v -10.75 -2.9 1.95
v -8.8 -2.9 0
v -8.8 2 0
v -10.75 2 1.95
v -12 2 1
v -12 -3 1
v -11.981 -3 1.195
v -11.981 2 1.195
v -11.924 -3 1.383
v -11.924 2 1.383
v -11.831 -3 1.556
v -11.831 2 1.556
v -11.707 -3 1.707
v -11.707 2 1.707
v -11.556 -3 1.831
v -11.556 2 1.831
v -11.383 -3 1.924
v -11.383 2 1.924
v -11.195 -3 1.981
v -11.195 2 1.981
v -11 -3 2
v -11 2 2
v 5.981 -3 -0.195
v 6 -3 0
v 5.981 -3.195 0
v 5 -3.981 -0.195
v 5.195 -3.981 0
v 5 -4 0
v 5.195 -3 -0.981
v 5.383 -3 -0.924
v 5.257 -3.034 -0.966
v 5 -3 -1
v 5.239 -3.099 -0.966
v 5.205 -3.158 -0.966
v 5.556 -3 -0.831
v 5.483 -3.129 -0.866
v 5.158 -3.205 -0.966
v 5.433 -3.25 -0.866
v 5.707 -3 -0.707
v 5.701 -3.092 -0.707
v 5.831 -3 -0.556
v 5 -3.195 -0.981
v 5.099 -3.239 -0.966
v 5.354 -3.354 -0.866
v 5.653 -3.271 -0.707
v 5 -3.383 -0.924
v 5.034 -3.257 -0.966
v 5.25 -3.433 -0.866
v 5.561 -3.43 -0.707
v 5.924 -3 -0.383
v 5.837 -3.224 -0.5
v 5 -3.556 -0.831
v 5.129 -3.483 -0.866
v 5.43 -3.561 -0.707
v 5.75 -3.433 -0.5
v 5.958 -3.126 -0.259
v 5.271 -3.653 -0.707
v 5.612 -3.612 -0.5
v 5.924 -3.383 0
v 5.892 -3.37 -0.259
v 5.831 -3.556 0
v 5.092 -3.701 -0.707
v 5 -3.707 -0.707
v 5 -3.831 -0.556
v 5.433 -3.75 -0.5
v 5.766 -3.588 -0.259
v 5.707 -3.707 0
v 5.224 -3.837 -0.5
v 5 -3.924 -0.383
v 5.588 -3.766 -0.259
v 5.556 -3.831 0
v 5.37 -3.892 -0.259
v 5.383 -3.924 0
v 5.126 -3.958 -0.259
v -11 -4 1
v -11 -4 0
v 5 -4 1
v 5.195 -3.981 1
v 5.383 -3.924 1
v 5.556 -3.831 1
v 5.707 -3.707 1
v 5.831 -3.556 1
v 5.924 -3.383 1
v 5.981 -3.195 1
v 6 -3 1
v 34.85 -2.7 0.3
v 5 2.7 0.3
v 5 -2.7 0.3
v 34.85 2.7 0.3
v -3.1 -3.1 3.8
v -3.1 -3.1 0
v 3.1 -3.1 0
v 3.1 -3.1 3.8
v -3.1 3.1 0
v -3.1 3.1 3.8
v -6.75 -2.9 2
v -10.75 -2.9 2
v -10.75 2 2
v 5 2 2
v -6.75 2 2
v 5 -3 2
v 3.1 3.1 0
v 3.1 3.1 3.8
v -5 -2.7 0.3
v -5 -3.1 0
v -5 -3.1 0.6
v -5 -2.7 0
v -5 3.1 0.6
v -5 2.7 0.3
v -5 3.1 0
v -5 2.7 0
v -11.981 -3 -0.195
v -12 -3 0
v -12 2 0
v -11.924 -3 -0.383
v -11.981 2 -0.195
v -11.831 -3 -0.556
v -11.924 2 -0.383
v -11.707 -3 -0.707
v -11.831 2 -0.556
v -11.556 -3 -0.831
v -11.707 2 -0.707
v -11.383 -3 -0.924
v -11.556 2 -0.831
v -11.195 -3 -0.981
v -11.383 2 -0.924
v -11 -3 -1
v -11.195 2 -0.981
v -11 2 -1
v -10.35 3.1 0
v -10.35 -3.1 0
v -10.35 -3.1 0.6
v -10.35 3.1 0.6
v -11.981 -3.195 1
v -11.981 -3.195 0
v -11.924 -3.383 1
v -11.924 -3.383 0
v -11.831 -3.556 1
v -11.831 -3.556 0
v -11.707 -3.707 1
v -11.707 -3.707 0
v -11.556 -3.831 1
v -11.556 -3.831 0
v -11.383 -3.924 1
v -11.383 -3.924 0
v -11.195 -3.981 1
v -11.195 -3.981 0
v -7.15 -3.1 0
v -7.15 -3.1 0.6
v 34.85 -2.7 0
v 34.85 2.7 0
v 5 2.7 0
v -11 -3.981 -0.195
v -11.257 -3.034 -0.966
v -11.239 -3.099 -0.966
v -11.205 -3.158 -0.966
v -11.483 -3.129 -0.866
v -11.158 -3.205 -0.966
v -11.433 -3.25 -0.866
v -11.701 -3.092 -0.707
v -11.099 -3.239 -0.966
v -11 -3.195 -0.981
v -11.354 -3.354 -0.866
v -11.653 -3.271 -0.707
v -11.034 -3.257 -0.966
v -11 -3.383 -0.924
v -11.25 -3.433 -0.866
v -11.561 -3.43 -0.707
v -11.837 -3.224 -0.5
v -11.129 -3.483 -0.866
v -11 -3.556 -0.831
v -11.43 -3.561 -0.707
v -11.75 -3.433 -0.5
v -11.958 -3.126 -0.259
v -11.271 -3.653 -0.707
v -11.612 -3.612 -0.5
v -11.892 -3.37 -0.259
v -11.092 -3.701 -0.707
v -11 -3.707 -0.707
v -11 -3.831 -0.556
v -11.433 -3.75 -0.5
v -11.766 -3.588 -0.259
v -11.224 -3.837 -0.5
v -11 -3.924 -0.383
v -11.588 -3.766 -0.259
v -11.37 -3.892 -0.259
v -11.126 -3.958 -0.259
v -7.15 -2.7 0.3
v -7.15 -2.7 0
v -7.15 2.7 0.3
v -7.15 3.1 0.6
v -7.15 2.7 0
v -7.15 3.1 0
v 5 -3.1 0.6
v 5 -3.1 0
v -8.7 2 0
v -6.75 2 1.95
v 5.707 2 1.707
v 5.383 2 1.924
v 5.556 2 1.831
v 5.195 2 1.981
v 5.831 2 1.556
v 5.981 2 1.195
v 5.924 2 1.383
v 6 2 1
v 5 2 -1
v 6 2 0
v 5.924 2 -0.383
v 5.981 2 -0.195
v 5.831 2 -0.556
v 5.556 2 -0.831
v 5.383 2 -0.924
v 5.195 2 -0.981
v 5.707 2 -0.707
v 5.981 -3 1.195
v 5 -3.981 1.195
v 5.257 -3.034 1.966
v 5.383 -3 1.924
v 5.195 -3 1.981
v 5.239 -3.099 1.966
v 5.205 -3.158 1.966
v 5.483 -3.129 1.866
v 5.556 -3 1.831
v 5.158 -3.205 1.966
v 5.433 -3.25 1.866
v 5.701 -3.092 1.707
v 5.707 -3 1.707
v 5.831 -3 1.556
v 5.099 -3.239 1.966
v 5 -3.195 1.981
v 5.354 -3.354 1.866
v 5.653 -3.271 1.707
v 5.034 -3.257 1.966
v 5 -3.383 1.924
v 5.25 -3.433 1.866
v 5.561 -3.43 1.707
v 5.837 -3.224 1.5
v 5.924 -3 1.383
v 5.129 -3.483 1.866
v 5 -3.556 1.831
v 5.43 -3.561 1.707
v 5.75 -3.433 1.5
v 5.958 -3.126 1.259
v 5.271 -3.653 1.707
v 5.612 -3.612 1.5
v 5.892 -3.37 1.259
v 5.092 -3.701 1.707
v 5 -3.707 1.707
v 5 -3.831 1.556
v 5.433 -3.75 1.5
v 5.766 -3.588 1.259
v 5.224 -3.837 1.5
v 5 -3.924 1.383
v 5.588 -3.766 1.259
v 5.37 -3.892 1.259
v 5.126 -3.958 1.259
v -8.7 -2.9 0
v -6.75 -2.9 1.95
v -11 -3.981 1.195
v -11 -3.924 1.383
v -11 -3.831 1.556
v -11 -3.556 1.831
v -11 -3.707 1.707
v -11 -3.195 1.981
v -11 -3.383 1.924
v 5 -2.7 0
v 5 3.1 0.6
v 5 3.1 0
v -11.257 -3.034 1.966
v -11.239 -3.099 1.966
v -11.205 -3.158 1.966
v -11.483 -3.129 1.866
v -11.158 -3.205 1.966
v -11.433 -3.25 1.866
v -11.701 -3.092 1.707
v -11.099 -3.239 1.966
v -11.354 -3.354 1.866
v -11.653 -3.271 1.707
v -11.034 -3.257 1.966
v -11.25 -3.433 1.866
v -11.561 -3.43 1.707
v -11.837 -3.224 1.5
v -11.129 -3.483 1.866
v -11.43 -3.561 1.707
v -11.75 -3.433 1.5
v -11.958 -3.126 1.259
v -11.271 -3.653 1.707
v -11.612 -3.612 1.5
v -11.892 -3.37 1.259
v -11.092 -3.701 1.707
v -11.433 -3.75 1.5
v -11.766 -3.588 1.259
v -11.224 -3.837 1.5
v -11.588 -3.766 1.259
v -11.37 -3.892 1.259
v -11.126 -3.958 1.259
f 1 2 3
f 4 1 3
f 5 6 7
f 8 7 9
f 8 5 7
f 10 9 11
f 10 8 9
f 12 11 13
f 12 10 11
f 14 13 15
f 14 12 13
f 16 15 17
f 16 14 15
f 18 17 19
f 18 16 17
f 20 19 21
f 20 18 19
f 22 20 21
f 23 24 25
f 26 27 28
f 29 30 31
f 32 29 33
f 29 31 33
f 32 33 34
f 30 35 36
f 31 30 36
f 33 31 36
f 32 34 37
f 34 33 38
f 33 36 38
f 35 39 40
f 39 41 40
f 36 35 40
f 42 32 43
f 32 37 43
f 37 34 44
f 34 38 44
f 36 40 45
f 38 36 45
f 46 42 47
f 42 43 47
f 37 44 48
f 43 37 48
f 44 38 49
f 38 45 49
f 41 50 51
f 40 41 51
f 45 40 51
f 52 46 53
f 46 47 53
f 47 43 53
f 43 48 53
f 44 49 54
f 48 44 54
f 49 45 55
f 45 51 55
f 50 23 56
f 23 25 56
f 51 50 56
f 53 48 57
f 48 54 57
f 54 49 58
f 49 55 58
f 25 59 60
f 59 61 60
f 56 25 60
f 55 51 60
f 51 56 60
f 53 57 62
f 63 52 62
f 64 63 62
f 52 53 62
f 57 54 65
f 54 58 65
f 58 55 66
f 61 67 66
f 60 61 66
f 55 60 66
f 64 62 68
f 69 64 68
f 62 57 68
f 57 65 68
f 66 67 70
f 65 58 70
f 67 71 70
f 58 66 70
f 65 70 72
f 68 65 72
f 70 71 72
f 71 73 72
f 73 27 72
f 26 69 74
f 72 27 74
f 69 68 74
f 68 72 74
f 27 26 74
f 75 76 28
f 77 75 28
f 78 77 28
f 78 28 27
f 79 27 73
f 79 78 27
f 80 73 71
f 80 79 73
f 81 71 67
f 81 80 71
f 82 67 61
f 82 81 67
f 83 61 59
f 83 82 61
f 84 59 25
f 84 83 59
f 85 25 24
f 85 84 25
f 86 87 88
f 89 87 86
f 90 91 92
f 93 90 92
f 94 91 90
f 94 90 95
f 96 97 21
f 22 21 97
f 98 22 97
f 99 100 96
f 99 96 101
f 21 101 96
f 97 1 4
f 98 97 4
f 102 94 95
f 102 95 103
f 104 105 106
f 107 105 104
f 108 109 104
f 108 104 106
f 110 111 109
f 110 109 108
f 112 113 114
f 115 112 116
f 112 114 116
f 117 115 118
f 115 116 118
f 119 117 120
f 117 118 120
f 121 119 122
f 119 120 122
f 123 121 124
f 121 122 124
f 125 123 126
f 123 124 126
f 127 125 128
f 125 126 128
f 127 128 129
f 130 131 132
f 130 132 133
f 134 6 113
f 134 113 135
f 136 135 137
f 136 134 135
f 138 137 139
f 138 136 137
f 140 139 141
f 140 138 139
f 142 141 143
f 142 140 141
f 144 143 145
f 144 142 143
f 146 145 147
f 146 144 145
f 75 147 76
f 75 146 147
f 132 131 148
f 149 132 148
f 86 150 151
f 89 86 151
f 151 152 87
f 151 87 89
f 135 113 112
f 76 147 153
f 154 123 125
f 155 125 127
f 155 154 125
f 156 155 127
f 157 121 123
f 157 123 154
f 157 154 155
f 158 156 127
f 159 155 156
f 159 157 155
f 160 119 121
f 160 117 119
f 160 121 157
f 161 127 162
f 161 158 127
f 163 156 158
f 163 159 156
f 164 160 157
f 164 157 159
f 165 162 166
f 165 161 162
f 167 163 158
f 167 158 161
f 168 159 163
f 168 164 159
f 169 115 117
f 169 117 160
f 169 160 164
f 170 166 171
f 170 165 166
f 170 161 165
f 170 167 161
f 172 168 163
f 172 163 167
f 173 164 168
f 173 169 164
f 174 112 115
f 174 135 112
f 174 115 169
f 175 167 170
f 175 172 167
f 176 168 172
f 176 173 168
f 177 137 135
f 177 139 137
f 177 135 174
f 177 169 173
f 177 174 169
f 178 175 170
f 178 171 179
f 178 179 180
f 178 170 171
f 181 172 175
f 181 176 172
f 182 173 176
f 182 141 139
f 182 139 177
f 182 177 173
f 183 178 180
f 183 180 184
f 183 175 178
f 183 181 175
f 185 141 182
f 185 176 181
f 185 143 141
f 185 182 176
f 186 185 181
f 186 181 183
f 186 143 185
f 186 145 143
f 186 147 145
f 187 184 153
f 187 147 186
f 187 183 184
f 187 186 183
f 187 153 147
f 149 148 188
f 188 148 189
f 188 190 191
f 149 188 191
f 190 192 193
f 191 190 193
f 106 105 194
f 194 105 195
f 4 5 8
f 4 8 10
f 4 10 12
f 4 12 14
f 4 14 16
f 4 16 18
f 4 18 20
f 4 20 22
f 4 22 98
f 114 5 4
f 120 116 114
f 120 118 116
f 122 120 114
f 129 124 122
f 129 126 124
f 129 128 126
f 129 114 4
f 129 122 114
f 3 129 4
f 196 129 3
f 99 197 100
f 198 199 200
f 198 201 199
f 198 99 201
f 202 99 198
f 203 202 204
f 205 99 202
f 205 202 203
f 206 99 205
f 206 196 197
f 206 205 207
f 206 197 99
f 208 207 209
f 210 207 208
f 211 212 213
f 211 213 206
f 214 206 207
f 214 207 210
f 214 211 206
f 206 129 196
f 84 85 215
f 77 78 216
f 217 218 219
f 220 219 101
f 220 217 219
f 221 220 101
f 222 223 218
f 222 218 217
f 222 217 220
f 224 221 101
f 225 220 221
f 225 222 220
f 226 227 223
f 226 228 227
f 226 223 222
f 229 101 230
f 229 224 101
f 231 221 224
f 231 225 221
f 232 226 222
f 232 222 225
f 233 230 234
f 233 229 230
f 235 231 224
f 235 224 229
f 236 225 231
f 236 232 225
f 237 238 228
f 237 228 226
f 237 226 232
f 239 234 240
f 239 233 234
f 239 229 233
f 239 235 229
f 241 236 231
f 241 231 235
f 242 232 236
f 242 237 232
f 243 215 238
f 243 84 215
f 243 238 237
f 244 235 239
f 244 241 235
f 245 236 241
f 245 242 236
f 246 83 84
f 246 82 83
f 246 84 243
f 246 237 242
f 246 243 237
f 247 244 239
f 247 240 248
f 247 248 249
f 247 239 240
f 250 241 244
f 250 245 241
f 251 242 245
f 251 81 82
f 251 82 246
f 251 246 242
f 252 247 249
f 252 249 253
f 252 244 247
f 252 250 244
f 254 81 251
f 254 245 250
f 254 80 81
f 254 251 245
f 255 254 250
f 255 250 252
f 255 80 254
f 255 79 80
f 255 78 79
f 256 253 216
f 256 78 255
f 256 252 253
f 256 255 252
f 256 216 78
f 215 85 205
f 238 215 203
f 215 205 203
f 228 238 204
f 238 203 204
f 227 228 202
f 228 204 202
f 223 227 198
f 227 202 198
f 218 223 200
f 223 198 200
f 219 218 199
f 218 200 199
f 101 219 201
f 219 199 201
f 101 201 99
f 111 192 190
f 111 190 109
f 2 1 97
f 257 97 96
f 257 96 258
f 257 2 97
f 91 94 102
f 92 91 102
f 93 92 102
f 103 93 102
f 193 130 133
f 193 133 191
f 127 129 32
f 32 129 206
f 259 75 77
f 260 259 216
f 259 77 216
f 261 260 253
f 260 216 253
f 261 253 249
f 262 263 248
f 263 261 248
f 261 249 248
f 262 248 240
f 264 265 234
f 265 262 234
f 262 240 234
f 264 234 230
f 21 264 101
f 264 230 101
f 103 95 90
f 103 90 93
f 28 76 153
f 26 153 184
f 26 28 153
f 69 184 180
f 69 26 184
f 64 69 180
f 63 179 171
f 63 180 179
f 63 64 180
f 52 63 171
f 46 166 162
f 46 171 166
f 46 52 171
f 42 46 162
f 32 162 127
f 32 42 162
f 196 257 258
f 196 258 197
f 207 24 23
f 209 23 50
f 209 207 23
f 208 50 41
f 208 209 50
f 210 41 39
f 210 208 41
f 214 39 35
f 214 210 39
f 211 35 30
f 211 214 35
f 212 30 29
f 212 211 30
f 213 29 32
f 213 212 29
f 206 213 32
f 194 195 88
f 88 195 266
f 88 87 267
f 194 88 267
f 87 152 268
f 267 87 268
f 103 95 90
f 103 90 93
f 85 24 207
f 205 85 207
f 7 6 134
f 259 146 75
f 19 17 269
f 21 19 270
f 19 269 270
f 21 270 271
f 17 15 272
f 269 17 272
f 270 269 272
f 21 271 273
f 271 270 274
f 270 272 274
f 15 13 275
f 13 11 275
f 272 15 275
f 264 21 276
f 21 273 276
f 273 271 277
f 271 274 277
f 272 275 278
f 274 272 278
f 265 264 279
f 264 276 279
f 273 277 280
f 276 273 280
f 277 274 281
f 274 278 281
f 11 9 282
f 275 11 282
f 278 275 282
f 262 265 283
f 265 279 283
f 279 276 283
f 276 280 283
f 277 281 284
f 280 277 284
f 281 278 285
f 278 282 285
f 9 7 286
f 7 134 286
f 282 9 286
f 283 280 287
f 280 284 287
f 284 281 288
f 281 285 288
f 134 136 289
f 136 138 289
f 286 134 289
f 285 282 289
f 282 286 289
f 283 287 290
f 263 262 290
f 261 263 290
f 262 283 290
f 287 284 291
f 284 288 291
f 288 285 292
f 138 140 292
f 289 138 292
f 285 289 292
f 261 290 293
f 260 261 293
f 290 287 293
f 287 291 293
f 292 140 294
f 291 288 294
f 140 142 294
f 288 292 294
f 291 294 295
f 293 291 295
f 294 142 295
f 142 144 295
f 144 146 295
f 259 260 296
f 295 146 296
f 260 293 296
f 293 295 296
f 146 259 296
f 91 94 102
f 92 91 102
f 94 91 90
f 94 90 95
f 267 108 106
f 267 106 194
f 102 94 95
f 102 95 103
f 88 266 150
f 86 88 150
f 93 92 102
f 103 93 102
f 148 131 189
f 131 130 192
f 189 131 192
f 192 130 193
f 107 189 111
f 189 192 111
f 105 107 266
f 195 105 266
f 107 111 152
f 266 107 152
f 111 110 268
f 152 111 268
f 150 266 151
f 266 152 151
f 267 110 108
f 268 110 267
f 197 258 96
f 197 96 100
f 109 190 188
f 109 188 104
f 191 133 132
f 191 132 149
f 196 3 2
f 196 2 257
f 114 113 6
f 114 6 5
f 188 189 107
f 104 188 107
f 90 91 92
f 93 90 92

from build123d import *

# Parameters (mm, degrees)
BOX_W        = 6.2
BOX_H        = 6.2
BOX_DEPTH    = 3.8
BOX003_W     = 3.2
BOX003_H     = 6.2
BOX003_DEPTH = 0.6
BOX002_W     = 2.15
BOX002_H     = 5.4
BOX002_DEPTH = 0.3
BOX001_W     = 10
BOX001_H     = 6.2
BOX001_DEPTH = 0.6
BOX004_W     = 30
BOX004_H     = 5.4
BOX004_DEPTH = 0.3
BOX006_W     = 6.2
BOX006_H     = 6.2
BOX006_DEPTH = 3.8
BOX007_W     = 4
BOX007_H     = 6.2
BOX007_DEPTH = 3
CHAMFER_SIZE = 1.95
BOX005_W     = 18
BOX005_H     = 6
BOX005_DEPTH = 3
FILLET_R     = 1


with BuildPart() as camera:
    # Box → Box (new body)
    with BuildSketch(Plane(origin=(-3.1, -3.1, 0), x_dir=(1, 0, 0), z_dir=(0, 0, 1))):
        with Locations((3.1, 3.1)):
            Rectangle(BOX_W, BOX_H)
    extrude(amount=BOX_DEPTH)


with BuildPart() as cube002:
    # Box003 → Box003 (new body)
    with BuildSketch(Plane(origin=(-10.35, -3.1, 0), x_dir=(1, 0, 0), z_dir=(0, 0, 1))):
        with Locations((1.6, 3.1)):
            Rectangle(BOX003_W, BOX003_H)
    extrude(amount=BOX003_DEPTH)


with BuildPart() as cube001:
    # Box002 → Box002 (new body)
    with BuildSketch(Plane(origin=(-7.15, -2.7, 0), x_dir=(1, 0, 0), z_dir=(0, 0, 1))):
        with Locations((1.075, 2.7)):
            Rectangle(BOX002_W, BOX002_H)
    extrude(amount=BOX002_DEPTH)


with BuildPart() as cube:
    # Box001 → Box001 (new body)
    with BuildSketch(Plane(origin=(-5, -3.1, 0), x_dir=(1, 0, 0), z_dir=(0, 0, 1))):
        with Locations((5, 3.1)):
            Rectangle(BOX001_W, BOX001_H)
    extrude(amount=BOX001_DEPTH)


with BuildPart() as fusion:
    # Box004 → Box004 (new body)
    with BuildSketch(Plane(origin=(4.85, -2.7, 0), x_dir=(1, 0, 0), z_dir=(0, 0, 1))):
        with Locations((15, 2.7)):
            Rectangle(BOX004_W, BOX004_H)
    extrude(amount=BOX004_DEPTH)

    # Fusion: union Cube002, Cube001, Cube
    add(cube002.part)
    add(cube001.part)
    add(cube.part)


with BuildPart() as camera001:
    # Box006 → Box006 (new body)
    with BuildSketch(Plane(origin=(-3.1, -3.1, 0), x_dir=(1, 0, 0), z_dir=(0, 0, 1))):
        with Locations((3.1, 3.1)):
            Rectangle(BOX006_W, BOX006_H)
    extrude(amount=BOX006_DEPTH)


with BuildPart() as chamfer_body:
    # Box007 → Box007 (new body)
    with BuildSketch(Plane(origin=(-10.75, -3.1, 0), x_dir=(1, 0, 0), z_dir=(0, 0, 1))):
        with Locations((2, 3.1)):
            Rectangle(BOX007_W, BOX007_H)
    extrude(amount=BOX007_DEPTH)

    # Chamfer
    chamfer_edges = [chamfer_body.edges().sort_by_distance(p)[0] for p in [
        (-10.75, 0, 0),
        (-6.75, 0, 0),
    ]]
    chamfer(chamfer_edges, length=CHAMFER_SIZE)


with BuildPart() as chamfer_body_1:
    # Chamfer placement: moved
    add(chamfer_body.part.moved(Location((0, 0.2, 0))))


with BuildPart() as cut:
    # Box005 → Box005 (new body)
    with BuildSketch(Plane(origin=(-12, -4, -1), x_dir=(1, 0, 0), z_dir=(0, 0, 1))):
        with Locations((9, 3)):
            Rectangle(BOX005_W, BOX005_H)
    extrude(amount=BOX005_DEPTH)

    # Fillet
    fillet_edges = [cut.edges().sort_by_distance(p)[0] for p in [
        (-12, -4, 0.5),
        (-12, -1, 2),
        (-12, -1, -1),
        (6, -4, 0.5),
        (6, -1, 2),
        (6, -1, -1),
        (-3, -4, -1),
        (-3, -4, 2),
    ]]
    fillet(fillet_edges, radius=FILLET_R)

    # Cut: cut Chamfer body
    add(chamfer_body_1.part, mode=Mode.SUBTRACT)


solid = Compound([camera.part, fusion.part, camera001.part, cut.part])
